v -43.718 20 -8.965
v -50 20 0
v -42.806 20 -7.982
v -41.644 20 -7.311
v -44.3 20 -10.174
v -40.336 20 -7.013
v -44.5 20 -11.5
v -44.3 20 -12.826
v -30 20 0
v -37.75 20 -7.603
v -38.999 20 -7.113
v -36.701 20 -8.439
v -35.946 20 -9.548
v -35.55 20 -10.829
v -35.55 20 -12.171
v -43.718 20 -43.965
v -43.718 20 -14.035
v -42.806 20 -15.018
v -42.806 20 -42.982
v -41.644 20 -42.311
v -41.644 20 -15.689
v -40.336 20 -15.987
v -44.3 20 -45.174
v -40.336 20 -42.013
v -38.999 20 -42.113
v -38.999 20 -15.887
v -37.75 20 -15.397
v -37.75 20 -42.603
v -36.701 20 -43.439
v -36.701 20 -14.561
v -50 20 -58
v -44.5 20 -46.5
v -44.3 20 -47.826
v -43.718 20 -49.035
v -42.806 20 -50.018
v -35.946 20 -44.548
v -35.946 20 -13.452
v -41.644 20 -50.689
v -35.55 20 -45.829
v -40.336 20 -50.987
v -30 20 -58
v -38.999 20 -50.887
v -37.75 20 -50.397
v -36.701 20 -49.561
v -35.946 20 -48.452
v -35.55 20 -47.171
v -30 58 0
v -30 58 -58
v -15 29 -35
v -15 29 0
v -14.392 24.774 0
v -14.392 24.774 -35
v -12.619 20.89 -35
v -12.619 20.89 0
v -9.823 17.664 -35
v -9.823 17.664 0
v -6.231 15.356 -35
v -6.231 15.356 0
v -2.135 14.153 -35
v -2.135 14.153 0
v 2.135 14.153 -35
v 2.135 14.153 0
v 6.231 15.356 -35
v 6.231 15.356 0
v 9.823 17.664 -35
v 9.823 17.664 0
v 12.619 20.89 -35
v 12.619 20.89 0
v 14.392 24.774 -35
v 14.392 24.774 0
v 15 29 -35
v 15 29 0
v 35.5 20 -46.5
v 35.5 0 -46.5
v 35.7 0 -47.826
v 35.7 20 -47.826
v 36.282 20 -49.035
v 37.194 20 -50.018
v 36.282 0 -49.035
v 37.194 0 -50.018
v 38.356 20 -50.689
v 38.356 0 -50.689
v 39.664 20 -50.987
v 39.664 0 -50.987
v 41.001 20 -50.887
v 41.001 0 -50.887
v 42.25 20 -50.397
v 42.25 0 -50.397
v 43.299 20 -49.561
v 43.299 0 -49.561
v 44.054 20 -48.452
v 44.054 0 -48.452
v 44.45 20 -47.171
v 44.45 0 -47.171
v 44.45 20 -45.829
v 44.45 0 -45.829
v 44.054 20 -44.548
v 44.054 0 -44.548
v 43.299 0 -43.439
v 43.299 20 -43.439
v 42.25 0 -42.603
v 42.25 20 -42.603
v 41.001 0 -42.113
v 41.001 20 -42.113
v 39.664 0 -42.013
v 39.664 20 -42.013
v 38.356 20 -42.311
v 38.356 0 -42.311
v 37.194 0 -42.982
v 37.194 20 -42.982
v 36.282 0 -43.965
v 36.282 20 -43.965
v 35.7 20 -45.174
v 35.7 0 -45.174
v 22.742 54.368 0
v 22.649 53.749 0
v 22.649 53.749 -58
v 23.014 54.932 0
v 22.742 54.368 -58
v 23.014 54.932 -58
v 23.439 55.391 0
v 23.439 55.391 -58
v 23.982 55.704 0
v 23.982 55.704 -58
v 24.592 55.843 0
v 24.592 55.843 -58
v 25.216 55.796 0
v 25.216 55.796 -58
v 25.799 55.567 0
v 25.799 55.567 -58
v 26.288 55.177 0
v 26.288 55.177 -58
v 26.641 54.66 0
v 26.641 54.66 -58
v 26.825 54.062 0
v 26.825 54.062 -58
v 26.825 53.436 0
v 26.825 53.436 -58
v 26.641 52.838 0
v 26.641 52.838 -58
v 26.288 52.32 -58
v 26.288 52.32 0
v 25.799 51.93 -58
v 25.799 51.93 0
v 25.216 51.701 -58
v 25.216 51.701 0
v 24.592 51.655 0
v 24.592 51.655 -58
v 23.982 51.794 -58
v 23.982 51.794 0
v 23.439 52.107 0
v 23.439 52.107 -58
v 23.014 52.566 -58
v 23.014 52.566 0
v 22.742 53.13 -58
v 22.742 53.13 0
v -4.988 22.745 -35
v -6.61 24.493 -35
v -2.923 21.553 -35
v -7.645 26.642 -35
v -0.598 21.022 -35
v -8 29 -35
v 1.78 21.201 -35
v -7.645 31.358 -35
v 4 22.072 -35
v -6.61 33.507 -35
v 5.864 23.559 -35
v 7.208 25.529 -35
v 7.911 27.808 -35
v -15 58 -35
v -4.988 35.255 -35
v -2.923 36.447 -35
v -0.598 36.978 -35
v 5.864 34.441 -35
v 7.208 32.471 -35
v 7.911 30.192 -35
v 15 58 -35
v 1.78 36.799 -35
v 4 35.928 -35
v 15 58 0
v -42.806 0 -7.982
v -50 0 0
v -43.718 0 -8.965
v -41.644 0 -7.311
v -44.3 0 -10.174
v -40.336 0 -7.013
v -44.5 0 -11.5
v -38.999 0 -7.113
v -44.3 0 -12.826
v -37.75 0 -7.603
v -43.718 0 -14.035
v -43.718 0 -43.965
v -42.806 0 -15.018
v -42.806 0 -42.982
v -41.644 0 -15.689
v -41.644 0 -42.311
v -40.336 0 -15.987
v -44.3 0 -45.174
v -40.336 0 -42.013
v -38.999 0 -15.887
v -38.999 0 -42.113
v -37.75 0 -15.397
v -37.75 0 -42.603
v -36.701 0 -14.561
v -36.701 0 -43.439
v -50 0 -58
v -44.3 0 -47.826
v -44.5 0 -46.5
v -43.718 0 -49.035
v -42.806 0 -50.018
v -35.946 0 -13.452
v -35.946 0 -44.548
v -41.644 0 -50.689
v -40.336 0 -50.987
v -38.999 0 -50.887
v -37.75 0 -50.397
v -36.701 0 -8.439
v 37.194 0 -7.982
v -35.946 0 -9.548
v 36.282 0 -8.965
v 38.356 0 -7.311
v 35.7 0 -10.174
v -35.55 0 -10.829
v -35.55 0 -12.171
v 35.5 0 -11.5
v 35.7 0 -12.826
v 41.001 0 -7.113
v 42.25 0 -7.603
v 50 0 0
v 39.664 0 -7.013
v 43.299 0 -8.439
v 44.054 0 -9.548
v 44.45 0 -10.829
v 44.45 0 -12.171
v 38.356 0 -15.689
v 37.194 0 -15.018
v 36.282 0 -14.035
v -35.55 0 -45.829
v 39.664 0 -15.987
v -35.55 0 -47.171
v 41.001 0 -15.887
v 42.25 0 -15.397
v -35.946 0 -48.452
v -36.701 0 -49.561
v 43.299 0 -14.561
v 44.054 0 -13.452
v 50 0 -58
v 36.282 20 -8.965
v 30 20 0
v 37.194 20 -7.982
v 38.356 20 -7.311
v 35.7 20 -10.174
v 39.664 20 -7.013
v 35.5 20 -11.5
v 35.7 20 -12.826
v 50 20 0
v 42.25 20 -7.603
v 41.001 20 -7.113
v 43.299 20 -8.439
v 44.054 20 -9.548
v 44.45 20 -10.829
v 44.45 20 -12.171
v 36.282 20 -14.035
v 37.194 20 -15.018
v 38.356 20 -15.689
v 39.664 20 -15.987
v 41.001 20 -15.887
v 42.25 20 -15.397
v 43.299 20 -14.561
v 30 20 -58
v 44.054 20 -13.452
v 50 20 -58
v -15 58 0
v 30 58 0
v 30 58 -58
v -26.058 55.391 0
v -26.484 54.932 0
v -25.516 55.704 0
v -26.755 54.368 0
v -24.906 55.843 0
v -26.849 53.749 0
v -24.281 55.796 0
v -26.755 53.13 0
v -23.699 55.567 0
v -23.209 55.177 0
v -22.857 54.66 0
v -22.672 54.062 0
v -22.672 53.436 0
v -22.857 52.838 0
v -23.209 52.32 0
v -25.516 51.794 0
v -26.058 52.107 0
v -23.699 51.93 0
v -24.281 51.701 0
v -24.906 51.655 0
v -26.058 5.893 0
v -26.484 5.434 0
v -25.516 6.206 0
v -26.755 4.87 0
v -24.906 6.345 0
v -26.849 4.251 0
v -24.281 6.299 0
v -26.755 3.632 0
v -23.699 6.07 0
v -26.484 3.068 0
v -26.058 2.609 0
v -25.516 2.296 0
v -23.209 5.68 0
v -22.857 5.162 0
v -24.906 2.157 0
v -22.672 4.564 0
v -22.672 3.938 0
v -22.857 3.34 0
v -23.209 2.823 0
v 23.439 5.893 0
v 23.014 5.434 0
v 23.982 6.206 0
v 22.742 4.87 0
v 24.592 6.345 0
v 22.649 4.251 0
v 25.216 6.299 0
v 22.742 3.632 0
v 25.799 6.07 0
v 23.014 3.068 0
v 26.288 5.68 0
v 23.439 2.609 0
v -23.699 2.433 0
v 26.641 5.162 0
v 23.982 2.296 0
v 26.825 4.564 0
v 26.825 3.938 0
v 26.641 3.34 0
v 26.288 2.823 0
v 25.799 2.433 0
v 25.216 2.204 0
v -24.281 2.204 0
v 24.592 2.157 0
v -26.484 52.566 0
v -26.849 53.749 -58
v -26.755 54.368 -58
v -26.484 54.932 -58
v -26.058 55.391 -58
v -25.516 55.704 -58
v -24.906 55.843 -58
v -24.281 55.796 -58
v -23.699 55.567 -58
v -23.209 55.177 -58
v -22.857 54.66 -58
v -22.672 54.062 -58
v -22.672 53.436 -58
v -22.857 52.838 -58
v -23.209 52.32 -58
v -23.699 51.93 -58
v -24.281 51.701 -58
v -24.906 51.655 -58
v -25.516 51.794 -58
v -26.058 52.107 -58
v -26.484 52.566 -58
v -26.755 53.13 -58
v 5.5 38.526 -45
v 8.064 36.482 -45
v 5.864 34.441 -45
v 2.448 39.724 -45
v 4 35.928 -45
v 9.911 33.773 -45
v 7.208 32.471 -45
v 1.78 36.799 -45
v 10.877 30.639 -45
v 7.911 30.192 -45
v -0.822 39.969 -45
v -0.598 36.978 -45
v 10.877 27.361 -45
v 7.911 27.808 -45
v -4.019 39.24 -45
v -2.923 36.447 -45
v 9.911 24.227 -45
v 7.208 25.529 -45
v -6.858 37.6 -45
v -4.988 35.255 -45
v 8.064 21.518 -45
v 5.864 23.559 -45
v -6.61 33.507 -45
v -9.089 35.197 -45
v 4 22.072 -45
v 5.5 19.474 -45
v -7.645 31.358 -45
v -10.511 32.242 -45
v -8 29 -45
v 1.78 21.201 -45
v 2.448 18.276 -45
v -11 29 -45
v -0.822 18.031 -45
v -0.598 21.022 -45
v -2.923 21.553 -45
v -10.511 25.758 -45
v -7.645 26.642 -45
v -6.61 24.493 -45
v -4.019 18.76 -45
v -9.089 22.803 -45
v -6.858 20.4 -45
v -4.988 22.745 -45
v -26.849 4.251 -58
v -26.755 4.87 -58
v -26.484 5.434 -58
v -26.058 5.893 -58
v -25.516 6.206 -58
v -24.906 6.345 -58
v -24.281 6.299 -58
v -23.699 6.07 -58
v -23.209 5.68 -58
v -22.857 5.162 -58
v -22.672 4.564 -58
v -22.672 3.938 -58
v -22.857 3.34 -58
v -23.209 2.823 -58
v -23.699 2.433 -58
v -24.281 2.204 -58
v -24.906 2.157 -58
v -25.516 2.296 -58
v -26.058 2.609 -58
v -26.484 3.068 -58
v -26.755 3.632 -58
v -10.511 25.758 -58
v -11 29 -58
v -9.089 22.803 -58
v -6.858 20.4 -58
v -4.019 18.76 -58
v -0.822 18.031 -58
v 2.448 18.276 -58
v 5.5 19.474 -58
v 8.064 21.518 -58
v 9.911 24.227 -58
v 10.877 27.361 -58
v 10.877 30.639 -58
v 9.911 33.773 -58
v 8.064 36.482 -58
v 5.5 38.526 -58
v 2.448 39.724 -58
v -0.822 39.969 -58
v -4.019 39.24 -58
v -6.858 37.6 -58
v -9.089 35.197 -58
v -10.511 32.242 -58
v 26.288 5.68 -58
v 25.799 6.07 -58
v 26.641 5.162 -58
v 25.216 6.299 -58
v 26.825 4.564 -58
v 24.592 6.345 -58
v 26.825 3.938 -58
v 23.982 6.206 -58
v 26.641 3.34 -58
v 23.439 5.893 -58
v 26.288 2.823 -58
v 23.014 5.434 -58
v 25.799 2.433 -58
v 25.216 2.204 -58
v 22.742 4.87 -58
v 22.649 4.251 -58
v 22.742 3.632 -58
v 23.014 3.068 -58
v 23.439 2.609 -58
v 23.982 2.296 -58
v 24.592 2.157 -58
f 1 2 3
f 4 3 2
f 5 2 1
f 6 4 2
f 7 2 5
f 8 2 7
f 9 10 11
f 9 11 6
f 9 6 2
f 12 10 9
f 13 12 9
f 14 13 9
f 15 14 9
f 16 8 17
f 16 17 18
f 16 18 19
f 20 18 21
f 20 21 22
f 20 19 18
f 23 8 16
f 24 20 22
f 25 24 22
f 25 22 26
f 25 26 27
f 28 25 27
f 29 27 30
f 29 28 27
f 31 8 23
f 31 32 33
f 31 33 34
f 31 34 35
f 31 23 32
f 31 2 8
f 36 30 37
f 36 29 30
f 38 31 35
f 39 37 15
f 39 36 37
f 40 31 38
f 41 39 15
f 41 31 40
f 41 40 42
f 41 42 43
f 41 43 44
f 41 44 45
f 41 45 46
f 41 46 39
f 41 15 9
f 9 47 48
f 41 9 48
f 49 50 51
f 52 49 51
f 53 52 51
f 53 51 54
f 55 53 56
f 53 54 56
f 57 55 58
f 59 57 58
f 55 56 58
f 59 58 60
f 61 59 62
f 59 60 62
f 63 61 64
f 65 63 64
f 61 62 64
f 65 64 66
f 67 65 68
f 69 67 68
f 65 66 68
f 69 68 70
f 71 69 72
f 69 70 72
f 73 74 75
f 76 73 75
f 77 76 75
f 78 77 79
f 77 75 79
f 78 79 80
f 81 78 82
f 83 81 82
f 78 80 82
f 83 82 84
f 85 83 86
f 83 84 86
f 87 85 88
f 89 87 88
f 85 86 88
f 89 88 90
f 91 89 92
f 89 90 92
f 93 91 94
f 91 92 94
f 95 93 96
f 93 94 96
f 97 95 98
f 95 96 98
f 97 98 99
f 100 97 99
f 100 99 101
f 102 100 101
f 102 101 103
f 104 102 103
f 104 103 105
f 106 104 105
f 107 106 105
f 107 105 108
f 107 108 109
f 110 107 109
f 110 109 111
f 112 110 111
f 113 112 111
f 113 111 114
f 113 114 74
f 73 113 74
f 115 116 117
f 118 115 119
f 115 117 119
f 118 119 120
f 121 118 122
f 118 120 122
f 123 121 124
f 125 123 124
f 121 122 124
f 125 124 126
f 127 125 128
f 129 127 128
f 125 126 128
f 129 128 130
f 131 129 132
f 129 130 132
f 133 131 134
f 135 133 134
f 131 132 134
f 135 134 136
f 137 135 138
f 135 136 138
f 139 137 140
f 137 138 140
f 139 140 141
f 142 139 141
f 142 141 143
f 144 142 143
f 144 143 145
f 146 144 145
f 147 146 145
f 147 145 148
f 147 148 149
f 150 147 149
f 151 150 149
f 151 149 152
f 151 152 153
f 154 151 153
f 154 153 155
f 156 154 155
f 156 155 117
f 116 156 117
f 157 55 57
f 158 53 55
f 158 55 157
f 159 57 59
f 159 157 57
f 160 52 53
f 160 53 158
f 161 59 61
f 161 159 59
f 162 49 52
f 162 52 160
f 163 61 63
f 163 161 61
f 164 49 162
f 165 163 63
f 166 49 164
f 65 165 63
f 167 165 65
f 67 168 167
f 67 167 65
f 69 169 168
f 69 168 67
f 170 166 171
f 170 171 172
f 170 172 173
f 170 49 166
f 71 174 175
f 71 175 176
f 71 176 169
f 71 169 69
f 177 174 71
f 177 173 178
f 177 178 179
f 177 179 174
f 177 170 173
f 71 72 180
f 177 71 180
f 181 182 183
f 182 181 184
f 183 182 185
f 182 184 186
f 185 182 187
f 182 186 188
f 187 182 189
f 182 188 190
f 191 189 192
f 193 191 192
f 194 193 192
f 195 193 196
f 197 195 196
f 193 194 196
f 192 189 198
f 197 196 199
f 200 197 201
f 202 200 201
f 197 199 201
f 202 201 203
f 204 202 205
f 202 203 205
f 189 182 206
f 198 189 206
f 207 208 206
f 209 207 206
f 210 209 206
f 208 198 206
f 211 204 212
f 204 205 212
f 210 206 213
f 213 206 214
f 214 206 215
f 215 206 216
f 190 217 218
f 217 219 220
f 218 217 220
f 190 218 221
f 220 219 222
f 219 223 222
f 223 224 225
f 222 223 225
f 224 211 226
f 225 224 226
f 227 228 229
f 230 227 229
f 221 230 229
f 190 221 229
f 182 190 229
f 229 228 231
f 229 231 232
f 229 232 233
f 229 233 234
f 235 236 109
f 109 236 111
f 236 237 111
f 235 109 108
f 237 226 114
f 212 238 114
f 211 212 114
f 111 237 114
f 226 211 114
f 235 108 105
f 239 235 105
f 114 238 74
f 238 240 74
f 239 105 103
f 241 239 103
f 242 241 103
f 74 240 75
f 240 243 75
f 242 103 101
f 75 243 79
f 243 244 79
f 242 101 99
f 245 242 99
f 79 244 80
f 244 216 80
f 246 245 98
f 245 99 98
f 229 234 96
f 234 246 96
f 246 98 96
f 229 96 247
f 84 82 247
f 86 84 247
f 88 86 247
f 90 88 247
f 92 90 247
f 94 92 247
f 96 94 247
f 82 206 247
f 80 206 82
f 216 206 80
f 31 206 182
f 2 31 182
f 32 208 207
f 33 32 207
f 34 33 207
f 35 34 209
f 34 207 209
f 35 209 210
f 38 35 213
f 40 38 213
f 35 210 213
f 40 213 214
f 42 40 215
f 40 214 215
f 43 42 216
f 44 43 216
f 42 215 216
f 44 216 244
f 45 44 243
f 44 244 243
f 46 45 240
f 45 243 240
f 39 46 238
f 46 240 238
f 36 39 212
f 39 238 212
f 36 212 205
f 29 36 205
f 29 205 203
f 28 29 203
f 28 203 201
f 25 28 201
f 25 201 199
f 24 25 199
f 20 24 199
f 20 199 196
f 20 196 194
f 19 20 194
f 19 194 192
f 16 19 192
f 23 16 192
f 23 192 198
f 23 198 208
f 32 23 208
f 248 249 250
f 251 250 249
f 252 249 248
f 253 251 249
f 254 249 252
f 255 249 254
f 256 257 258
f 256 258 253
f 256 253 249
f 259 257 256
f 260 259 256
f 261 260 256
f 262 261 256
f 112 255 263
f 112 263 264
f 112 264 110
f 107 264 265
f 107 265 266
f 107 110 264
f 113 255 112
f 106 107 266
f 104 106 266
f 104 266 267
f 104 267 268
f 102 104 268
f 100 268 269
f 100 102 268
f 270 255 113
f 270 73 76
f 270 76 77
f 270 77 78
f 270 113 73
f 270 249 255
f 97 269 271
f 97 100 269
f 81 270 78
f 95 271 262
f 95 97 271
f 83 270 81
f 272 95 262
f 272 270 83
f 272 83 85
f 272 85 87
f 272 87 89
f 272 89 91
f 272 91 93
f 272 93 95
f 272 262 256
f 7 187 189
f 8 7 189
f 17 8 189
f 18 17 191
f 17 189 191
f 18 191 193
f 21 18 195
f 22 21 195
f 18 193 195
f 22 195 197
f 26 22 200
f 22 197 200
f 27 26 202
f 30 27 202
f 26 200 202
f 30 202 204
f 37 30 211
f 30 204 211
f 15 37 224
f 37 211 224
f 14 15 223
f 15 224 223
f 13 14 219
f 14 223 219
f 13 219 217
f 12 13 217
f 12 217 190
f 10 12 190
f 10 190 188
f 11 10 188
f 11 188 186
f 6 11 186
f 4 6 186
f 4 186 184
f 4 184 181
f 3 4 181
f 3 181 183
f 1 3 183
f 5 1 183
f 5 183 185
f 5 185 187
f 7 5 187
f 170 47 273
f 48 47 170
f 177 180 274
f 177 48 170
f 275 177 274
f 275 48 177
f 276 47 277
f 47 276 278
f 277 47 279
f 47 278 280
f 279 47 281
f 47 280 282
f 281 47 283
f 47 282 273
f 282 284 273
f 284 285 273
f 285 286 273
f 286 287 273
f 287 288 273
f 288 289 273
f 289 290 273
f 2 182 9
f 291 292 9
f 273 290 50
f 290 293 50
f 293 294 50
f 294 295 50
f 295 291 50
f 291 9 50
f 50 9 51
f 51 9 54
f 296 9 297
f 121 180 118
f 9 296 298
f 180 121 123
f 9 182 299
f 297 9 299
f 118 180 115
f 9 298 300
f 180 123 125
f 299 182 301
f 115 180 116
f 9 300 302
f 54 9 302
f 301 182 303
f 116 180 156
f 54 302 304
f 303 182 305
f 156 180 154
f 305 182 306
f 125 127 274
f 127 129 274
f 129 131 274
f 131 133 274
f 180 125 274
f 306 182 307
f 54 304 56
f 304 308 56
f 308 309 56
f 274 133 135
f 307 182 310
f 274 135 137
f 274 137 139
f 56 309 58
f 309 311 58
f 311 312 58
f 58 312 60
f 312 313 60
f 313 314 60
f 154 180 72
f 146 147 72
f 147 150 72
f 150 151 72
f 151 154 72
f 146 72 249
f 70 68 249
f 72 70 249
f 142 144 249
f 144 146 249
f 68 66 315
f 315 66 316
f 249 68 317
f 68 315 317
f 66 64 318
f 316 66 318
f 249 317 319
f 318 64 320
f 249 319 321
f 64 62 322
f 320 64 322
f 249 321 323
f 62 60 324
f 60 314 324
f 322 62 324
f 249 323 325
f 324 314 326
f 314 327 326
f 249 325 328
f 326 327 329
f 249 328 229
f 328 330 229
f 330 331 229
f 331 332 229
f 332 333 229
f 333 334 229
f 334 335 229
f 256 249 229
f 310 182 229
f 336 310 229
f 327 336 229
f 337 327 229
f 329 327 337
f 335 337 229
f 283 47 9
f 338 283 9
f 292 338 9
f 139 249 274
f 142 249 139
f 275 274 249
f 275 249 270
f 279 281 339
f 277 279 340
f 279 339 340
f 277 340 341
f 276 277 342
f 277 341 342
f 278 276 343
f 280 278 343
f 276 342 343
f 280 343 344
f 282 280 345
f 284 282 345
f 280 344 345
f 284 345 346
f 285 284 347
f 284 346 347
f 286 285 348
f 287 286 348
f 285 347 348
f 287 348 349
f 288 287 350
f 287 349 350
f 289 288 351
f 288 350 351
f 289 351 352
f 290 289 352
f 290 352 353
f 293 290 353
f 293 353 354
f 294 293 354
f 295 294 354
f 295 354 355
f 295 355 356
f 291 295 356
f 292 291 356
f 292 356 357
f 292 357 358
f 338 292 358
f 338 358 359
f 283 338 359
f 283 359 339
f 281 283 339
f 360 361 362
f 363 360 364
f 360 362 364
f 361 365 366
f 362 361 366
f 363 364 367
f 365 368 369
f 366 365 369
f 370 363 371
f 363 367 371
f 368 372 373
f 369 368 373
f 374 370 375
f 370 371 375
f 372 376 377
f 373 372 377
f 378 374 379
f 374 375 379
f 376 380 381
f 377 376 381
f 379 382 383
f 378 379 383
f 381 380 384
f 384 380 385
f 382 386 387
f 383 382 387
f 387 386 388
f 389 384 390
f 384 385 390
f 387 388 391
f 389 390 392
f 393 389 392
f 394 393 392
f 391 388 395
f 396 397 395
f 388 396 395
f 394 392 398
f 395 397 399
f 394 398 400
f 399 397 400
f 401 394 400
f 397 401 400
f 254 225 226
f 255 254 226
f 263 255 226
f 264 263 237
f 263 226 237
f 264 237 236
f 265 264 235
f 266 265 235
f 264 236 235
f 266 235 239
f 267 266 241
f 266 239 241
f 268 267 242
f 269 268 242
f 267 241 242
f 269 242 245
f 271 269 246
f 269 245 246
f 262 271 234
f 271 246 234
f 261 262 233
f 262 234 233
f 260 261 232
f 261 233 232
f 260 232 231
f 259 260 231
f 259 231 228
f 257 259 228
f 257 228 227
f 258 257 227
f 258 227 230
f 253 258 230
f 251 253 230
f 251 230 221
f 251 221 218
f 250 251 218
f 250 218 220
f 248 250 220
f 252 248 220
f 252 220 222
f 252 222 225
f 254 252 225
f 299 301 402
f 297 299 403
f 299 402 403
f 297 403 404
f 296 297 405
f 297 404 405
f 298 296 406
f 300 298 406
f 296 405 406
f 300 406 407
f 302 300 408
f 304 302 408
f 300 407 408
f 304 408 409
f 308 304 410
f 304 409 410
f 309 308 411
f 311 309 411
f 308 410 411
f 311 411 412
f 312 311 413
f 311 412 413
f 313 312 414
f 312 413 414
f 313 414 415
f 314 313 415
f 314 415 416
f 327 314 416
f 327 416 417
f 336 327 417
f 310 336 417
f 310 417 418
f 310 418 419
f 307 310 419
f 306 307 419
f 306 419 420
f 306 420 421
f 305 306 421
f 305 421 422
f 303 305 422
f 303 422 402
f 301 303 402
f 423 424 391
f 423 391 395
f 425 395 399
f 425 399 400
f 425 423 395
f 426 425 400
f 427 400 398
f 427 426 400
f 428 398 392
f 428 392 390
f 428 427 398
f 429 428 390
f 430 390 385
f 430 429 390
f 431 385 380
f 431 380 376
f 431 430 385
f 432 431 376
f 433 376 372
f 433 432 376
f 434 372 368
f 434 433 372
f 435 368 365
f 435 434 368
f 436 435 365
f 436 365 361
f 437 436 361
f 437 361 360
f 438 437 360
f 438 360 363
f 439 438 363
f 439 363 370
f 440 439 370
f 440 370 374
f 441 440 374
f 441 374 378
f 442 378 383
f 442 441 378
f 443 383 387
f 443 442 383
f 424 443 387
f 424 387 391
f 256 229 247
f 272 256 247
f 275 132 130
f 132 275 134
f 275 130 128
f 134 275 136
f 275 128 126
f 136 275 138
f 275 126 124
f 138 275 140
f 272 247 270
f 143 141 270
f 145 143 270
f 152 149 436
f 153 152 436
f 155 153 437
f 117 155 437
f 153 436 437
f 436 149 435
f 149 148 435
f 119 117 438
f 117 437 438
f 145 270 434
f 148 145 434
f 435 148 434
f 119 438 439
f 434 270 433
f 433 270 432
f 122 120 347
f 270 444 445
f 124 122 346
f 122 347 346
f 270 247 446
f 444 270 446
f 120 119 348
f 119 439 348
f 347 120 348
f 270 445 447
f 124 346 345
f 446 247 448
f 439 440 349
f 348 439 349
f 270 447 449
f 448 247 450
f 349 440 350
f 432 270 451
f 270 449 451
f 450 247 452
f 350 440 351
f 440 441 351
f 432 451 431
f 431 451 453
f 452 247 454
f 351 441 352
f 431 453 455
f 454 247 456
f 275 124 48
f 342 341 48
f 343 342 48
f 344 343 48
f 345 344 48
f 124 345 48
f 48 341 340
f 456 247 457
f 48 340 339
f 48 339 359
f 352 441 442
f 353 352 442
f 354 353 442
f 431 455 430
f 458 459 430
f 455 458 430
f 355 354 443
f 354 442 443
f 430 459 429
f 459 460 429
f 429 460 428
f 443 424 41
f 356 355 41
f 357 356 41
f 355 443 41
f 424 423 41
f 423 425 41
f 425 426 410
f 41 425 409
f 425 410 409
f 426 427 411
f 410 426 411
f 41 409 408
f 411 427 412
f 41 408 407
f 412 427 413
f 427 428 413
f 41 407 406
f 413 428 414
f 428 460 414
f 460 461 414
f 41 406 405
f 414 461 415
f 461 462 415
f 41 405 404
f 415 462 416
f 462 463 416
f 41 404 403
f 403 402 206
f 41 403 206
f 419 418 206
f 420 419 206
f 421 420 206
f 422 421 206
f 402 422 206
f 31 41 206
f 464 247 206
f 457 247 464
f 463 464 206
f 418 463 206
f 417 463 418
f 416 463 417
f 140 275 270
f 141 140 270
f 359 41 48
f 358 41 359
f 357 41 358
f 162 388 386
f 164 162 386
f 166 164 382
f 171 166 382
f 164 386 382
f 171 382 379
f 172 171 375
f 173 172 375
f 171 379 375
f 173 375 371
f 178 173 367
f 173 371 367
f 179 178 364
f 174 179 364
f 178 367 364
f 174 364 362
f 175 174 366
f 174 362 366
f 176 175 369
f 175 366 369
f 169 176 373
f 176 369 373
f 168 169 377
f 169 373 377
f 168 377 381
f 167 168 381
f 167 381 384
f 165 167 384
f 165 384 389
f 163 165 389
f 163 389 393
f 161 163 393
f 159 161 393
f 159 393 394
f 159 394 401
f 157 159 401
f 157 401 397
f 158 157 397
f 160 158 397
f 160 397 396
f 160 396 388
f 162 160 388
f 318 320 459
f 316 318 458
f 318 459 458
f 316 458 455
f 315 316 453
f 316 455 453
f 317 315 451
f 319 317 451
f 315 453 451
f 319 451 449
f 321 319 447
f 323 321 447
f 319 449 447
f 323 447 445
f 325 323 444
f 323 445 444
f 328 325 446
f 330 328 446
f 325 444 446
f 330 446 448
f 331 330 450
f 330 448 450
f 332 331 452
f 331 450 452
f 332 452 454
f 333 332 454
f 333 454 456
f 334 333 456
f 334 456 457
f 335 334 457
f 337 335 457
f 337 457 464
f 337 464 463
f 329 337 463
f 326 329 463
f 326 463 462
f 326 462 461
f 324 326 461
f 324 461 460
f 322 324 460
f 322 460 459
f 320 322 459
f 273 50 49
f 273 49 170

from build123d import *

# Parameters (mm, degrees)
BOSS_EXTRUDE1_DEPTH  = 58
SKETCH3_R            = 11
CUT_EXTRUDE1_DEPTH   = 13
SKETCH4_R            = 8
CUT_EXTRUDE2_DEPTH   = 89.820042783
SKETCH5_R            = 15
CUT_EXTRUDE3_DEPTH   = 35
SKETCH6_W            = 30
SKETCH6_H            = 29
CUT_EXTRUDE4_DEPTH   = 35
M5_TAPPED_HOLE1_D    = 4.2
SKETCH12_W           = 20
SKETCH12_H           = 58
CUT_EXTRUDE6_DEPTH   = 38
M8_CLEARANCE_HOLE1_D = 9


with BuildPart() as part:
    # Sketch2 → Boss-Extrude1 (new body)
    with BuildSketch(Plane(origin=(0, 0, 0), x_dir=(1, 0, 0), z_dir=(0, 1, 0))):
        Polygon((-50, 0), (0, 0), (50, 0), (50, 58), (-50, 58), align=None)
    extrude(amount=BOSS_EXTRUDE1_DEPTH)

    # Sketch3 → Cut-Extrude1 (cut)
    with BuildSketch(Plane.XY.offset(-58)):
        with Locations(Location((0, 29, 0), (0, 0, 180))):
            Circle(SKETCH3_R)
    extrude(amount=CUT_EXTRUDE1_DEPTH, mode=Mode.SUBTRACT)

    # Sketch4 → Cut-Extrude2 (cut, through all)
    with BuildSketch(Plane(origin=(0, 0, -45), x_dir=(-1, 0, 0), z_dir=(0, 0, -1))):
        with Locations((0, 29)):
            Circle(SKETCH4_R)
    extrude(amount=-CUT_EXTRUDE2_DEPTH, mode=Mode.SUBTRACT)

    # Sketch5 → Cut-Extrude3 (cut)
    with BuildSketch(Plane.XY):
        with Locations((0, 29)):
            Circle(SKETCH5_R)
    extrude(amount=-CUT_EXTRUDE3_DEPTH, mode=Mode.SUBTRACT)

    # Sketch6 → Cut-Extrude4 (cut)
    with BuildSketch(Plane.XY):
        with Locations((0, 43.5)):
            Rectangle(SKETCH6_W, SKETCH6_H)
    extrude(amount=-CUT_EXTRUDE4_DEPTH, mode=Mode.SUBTRACT)

    # M5 Tapped Hole1 (through all)
    with Locations(Plane(origin=(8.704435936, 17.394887918, 0), x_dir=(1, 0, 0), z_dir=(0, 0, 1))):
        with Locations((16.044301406, 36.353849424), (-33.453173277, 36.353849424), (-33.453173277, -13.143625259), (16.044301406, -13.143625259)):
            Hole(M5_TAPPED_HOLE1_D / 2)

    # Sketch12 → Cut-Extrude6 (cut)
    with BuildSketch(Plane(origin=(0, 58, 0), x_dir=(1, 0, 0), z_dir=(0, 1, 0))):
        with Locations((-40, 29)):
            Rectangle(SKETCH12_W, SKETCH12_H)
        with Locations((40, 29)):
            Rectangle(SKETCH12_W, SKETCH12_H)
    extrude(amount=-CUT_EXTRUDE6_DEPTH, mode=Mode.SUBTRACT)

    # M8 Clearance Hole1 (through all)
    with Locations(Plane(origin=(8.704435936, 20, -505.336111538), x_dir=(1, 0, 0), z_dir=(0, 1, 0))):
        with Locations((-48.704435936, -458.836111538), (-48.704435936, -493.836111538), (31.295564064, -458.836111538), (31.295564064, -493.836111538), (-48.704435936, 58.078352635), (31.295564064, 58.078352635)):
            Hole(M8_CLEARANCE_HOLE1_D / 2)


solid = part.part
